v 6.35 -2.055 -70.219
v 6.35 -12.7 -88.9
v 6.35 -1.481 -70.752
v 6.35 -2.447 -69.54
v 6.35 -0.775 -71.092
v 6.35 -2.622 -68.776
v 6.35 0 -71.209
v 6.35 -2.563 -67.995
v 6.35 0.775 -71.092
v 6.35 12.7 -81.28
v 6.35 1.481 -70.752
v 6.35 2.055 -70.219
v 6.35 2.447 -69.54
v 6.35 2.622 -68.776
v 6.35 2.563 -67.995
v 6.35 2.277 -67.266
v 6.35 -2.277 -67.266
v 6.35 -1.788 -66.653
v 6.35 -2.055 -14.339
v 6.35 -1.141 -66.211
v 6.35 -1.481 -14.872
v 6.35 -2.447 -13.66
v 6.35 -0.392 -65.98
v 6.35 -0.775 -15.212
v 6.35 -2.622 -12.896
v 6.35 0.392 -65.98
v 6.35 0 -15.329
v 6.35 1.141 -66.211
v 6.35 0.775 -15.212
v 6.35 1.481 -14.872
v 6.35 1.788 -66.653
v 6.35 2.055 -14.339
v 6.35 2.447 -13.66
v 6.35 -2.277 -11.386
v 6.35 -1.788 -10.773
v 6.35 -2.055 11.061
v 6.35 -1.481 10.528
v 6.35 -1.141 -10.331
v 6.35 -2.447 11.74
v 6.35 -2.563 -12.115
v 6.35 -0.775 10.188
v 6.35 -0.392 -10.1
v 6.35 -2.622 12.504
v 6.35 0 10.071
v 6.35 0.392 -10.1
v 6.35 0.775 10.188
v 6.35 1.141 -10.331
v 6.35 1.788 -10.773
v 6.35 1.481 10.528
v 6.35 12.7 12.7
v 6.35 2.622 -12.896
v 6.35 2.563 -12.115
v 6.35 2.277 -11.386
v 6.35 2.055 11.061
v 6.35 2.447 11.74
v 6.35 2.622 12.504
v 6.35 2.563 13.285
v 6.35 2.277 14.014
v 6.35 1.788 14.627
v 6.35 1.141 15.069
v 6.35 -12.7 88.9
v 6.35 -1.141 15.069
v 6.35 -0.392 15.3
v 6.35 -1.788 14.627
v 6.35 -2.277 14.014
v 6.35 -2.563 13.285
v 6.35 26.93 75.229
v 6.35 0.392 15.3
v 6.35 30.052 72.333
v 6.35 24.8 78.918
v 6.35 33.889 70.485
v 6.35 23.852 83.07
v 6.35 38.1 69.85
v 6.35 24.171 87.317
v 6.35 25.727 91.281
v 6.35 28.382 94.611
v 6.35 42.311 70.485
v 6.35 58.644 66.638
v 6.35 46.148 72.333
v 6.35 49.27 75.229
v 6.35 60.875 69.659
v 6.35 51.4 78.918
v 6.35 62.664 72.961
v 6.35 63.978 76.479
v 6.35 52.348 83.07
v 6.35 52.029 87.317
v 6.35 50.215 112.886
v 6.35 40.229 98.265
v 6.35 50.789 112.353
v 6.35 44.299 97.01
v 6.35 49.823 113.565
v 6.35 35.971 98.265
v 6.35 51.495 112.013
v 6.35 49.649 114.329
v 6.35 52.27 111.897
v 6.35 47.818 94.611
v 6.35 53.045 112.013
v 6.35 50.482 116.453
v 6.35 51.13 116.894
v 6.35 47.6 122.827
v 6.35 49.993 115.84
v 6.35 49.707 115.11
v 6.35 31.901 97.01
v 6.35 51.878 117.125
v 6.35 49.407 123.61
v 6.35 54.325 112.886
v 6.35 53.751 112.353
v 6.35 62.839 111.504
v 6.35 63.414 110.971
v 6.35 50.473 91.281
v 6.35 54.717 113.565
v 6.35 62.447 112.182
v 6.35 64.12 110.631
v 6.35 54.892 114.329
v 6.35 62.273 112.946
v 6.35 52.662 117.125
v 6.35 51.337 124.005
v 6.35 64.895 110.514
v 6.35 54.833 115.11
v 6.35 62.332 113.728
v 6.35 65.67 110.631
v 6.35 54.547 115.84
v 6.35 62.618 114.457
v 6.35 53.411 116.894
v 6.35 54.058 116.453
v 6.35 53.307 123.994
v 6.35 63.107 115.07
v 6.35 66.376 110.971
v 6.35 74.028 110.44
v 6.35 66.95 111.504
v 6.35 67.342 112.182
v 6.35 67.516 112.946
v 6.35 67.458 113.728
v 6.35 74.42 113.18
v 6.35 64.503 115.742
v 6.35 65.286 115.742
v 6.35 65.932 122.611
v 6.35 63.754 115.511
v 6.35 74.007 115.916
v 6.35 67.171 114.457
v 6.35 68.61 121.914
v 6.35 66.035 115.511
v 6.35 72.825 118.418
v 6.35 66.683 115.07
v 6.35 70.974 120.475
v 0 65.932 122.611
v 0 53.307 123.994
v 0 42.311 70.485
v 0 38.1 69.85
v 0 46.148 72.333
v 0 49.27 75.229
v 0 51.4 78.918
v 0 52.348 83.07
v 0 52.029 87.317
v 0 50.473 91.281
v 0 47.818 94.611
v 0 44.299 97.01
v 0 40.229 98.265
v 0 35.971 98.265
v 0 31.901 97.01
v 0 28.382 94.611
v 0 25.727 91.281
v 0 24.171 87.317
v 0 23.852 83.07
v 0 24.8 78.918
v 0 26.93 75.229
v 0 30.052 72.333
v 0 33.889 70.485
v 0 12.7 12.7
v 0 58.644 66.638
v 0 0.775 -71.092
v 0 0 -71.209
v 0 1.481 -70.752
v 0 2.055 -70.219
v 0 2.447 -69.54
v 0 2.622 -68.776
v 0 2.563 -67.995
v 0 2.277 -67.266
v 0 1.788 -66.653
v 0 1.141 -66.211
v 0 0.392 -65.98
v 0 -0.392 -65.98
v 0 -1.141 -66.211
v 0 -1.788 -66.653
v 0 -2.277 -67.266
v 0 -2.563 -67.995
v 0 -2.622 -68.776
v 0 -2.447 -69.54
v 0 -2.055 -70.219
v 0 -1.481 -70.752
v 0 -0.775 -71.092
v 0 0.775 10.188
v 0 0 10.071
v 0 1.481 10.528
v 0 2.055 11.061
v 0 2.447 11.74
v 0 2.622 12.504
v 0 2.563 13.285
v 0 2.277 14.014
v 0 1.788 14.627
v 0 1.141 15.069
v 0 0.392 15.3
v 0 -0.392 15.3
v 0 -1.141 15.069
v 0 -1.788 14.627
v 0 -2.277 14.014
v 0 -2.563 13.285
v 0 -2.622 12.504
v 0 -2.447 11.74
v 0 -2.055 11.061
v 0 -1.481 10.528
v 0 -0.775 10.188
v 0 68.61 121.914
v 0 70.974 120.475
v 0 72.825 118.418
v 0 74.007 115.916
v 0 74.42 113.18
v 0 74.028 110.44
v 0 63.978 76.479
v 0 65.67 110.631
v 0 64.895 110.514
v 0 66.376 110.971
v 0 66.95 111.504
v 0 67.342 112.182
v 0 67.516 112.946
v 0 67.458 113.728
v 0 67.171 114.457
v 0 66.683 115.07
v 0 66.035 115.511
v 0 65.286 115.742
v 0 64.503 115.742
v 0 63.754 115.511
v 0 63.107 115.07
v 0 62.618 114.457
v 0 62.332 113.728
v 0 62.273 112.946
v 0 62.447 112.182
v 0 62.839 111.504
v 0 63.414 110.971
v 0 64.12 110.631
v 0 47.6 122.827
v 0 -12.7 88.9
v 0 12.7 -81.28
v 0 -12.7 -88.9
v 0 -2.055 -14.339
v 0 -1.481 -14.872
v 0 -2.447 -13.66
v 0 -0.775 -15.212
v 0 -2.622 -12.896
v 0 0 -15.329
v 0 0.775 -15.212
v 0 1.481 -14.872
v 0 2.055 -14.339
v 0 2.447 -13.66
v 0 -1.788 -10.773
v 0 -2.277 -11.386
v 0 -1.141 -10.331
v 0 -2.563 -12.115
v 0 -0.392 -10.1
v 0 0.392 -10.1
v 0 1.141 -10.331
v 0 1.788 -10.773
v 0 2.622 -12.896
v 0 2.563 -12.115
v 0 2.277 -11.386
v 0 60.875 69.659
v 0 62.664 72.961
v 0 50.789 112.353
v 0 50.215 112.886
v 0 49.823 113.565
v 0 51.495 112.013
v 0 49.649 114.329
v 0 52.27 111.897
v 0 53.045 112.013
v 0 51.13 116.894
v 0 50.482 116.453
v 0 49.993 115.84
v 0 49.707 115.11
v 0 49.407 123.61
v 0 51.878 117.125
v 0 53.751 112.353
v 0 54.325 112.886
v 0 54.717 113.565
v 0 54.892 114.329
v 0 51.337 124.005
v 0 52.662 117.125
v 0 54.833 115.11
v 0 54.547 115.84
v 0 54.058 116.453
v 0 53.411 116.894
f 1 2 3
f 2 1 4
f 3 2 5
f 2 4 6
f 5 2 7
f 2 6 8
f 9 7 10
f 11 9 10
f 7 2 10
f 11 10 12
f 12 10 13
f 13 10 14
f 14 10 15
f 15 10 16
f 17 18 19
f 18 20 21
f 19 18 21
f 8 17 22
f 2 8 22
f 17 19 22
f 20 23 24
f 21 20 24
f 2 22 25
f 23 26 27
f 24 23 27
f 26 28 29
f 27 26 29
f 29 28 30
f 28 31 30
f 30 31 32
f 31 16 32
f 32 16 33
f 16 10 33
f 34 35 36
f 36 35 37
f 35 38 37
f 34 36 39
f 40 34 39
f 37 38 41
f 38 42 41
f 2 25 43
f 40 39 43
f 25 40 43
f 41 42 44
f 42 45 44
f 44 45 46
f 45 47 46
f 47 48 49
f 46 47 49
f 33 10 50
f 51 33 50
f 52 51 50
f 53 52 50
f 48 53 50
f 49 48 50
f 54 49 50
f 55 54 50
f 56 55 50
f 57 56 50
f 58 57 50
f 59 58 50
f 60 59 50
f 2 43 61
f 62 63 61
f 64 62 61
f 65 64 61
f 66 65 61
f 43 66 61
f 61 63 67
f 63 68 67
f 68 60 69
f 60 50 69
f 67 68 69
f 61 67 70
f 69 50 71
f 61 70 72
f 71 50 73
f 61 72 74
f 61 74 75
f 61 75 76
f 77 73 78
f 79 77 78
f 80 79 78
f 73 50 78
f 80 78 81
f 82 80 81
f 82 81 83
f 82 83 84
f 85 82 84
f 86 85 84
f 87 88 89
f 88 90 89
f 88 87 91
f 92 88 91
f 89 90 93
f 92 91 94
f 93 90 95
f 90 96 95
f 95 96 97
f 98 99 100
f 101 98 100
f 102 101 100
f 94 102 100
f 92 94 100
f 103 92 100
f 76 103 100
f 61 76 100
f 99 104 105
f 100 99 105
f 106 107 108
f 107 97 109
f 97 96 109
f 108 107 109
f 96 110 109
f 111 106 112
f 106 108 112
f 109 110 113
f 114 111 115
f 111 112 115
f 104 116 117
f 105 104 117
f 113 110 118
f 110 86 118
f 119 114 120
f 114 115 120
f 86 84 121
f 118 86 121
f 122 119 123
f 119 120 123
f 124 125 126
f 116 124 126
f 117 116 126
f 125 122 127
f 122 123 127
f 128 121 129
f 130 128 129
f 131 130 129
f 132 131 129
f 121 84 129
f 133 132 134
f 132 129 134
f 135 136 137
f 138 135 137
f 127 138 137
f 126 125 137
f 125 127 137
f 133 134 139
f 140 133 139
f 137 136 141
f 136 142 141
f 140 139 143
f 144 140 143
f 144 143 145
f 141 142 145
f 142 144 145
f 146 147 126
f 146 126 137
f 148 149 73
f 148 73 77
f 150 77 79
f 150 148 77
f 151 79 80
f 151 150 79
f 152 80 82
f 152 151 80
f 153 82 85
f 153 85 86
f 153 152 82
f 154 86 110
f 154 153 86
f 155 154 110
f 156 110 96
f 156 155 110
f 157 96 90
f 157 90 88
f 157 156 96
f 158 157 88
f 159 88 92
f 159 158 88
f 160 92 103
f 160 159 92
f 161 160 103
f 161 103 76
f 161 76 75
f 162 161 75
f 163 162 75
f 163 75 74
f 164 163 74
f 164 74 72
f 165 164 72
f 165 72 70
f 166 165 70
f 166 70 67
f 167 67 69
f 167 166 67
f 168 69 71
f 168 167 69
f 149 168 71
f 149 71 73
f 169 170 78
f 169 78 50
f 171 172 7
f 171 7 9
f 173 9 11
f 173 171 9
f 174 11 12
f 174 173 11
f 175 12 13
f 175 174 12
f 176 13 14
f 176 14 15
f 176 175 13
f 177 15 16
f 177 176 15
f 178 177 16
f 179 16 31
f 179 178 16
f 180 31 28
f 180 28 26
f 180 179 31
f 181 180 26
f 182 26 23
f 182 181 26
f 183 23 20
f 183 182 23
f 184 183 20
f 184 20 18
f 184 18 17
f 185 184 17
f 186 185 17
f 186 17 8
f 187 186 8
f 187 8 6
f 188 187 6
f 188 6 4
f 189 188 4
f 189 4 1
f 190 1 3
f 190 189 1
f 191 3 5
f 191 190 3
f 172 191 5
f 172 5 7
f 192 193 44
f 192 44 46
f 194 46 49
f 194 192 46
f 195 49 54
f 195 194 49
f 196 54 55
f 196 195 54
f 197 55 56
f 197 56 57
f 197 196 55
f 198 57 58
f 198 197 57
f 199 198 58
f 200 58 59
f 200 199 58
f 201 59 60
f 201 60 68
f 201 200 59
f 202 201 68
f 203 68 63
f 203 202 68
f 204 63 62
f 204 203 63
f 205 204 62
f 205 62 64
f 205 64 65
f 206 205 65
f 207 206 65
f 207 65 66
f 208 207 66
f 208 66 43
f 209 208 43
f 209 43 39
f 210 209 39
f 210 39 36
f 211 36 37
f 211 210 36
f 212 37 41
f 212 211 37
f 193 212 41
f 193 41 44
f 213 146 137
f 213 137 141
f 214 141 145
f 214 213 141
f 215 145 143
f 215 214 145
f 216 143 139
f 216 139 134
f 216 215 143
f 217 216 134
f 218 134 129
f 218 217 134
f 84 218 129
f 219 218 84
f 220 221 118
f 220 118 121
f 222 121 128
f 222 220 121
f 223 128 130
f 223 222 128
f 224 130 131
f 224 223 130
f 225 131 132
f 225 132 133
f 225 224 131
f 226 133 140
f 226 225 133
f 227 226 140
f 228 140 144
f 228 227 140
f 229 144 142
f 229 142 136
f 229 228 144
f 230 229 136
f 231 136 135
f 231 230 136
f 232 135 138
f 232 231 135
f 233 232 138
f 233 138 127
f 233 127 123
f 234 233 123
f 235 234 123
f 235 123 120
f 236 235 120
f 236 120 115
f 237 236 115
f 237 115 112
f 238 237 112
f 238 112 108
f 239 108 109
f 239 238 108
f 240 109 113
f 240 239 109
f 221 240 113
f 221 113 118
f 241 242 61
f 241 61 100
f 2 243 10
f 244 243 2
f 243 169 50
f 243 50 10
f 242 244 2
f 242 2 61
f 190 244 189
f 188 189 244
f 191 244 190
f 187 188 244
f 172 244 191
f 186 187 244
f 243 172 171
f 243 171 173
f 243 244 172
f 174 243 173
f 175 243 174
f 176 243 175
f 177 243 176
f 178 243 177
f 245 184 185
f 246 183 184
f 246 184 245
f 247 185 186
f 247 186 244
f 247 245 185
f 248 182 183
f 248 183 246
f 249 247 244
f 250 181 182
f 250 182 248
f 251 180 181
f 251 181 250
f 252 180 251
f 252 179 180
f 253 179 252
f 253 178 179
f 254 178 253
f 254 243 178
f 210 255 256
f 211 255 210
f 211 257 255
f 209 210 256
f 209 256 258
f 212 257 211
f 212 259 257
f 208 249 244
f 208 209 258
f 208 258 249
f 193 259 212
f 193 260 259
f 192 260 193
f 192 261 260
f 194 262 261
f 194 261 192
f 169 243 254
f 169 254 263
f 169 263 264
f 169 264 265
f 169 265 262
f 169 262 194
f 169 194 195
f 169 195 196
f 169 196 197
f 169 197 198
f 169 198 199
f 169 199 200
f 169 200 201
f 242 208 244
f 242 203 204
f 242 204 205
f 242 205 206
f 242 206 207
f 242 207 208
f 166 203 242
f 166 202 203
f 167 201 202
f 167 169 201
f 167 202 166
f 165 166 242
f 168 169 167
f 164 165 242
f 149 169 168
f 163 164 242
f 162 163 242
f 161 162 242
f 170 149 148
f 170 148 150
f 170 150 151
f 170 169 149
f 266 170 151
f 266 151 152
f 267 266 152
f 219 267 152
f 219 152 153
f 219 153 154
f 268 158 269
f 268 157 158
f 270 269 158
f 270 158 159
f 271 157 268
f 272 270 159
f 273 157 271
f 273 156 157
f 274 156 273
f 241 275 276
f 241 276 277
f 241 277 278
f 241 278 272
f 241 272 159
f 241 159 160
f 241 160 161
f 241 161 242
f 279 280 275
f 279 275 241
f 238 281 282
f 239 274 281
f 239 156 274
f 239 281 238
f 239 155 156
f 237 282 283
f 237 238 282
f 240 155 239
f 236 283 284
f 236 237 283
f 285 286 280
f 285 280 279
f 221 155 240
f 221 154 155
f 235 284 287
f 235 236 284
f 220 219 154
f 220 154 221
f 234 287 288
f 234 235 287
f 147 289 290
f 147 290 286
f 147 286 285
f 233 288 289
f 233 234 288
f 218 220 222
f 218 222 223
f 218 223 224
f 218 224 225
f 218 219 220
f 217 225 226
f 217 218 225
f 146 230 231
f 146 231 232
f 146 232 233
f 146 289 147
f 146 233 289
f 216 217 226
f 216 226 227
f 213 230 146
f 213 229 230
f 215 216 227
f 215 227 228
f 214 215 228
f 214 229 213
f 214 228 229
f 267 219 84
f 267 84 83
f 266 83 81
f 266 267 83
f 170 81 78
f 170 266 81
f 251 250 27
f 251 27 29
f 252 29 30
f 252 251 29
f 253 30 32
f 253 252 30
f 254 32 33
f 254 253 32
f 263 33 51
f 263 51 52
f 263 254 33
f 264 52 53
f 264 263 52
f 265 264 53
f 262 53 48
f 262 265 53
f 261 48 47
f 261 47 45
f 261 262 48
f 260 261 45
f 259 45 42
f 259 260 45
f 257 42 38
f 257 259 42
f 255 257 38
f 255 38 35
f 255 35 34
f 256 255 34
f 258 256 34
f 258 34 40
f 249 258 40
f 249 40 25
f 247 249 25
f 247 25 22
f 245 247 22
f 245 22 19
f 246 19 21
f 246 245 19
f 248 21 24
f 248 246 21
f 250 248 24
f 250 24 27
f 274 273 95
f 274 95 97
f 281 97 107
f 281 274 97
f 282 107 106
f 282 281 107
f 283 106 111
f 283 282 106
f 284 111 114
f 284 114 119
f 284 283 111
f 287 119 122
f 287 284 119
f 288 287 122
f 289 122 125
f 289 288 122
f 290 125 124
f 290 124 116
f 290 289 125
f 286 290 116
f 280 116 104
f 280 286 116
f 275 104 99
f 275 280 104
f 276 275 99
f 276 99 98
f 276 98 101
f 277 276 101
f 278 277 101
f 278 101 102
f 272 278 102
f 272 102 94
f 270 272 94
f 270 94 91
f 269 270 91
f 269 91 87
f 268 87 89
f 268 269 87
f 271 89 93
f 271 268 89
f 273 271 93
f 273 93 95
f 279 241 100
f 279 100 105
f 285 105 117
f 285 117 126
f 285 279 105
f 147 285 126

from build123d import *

# Parameters (mm, degrees)
SKETCH1_R           = 14.2875
SKETCH1_R_2         = 2.6289
BOSS_EXTRUDE1_DEPTH = 6.35


with BuildPart() as part:
    # Sketch1 → Boss-Extrude1 (new body)
    with BuildSketch(Plane(origin=(0, 0, 0), x_dir=(0, 0, -1), z_dir=(1, 0, 0))):
        with BuildLine():
            Line((-12.7, -12.7), (-88.9, -12.7))
            Line((-88.9, -12.7), (-122.826729432, 47.599537172))
            ThreePointArc((-122.826729432, 47.599537172), (-123.857351192, 50.361897296), (-123.993843813, 53.307094137))
            Line((-123.993843813, 53.307094137), (-122.611234502, 65.931609632))
            ThreePointArc((-122.611234502, 65.931609632), (-118.418396066, 72.825240039), (-110.43997975, 74.028114691))
            Line((-110.43997975, 74.028114691), (-76.479373631, 63.978142452))
            ThreePointArc((-76.479373631, 63.978142452), (-71.278861085, 61.827211414), (-66.637517322, 58.644482532))
            Line((-66.637517322, 58.644482532), (-12.7, 12.7))
            Line((-12.7, 12.7), (25.4, 12.7))
            Line((25.4, 12.7), (81.28, 12.7))
            Line((81.28, 12.7), (88.9, -12.7))
            Line((88.9, -12.7), (25.4, -12.7))
            Line((25.4, -12.7), (-12.7, -12.7))
        make_face()
        with Locations((-84.1375, 38.1)):
            Circle(SKETCH1_R, mode=Mode.SUBTRACT)
        with Locations((-12.7, 0)):
            Circle(SKETCH1_R_2, mode=Mode.SUBTRACT)
        with Locations((12.7, 0)):
            Circle(SKETCH1_R_2, mode=Mode.SUBTRACT)
        with Locations((68.58, 0)):
            Circle(SKETCH1_R_2, mode=Mode.SUBTRACT)
        with Locations((-113.142847881, 64.894652649)):
            Circle(SKETCH1_R_2, mode=Mode.SUBTRACT)
        with Locations((-114.525457191, 52.270137154)):
            Circle(SKETCH1_R_2, mode=Mode.SUBTRACT)
    extrude(amount=BOSS_EXTRUDE1_DEPTH)


solid = part.part
